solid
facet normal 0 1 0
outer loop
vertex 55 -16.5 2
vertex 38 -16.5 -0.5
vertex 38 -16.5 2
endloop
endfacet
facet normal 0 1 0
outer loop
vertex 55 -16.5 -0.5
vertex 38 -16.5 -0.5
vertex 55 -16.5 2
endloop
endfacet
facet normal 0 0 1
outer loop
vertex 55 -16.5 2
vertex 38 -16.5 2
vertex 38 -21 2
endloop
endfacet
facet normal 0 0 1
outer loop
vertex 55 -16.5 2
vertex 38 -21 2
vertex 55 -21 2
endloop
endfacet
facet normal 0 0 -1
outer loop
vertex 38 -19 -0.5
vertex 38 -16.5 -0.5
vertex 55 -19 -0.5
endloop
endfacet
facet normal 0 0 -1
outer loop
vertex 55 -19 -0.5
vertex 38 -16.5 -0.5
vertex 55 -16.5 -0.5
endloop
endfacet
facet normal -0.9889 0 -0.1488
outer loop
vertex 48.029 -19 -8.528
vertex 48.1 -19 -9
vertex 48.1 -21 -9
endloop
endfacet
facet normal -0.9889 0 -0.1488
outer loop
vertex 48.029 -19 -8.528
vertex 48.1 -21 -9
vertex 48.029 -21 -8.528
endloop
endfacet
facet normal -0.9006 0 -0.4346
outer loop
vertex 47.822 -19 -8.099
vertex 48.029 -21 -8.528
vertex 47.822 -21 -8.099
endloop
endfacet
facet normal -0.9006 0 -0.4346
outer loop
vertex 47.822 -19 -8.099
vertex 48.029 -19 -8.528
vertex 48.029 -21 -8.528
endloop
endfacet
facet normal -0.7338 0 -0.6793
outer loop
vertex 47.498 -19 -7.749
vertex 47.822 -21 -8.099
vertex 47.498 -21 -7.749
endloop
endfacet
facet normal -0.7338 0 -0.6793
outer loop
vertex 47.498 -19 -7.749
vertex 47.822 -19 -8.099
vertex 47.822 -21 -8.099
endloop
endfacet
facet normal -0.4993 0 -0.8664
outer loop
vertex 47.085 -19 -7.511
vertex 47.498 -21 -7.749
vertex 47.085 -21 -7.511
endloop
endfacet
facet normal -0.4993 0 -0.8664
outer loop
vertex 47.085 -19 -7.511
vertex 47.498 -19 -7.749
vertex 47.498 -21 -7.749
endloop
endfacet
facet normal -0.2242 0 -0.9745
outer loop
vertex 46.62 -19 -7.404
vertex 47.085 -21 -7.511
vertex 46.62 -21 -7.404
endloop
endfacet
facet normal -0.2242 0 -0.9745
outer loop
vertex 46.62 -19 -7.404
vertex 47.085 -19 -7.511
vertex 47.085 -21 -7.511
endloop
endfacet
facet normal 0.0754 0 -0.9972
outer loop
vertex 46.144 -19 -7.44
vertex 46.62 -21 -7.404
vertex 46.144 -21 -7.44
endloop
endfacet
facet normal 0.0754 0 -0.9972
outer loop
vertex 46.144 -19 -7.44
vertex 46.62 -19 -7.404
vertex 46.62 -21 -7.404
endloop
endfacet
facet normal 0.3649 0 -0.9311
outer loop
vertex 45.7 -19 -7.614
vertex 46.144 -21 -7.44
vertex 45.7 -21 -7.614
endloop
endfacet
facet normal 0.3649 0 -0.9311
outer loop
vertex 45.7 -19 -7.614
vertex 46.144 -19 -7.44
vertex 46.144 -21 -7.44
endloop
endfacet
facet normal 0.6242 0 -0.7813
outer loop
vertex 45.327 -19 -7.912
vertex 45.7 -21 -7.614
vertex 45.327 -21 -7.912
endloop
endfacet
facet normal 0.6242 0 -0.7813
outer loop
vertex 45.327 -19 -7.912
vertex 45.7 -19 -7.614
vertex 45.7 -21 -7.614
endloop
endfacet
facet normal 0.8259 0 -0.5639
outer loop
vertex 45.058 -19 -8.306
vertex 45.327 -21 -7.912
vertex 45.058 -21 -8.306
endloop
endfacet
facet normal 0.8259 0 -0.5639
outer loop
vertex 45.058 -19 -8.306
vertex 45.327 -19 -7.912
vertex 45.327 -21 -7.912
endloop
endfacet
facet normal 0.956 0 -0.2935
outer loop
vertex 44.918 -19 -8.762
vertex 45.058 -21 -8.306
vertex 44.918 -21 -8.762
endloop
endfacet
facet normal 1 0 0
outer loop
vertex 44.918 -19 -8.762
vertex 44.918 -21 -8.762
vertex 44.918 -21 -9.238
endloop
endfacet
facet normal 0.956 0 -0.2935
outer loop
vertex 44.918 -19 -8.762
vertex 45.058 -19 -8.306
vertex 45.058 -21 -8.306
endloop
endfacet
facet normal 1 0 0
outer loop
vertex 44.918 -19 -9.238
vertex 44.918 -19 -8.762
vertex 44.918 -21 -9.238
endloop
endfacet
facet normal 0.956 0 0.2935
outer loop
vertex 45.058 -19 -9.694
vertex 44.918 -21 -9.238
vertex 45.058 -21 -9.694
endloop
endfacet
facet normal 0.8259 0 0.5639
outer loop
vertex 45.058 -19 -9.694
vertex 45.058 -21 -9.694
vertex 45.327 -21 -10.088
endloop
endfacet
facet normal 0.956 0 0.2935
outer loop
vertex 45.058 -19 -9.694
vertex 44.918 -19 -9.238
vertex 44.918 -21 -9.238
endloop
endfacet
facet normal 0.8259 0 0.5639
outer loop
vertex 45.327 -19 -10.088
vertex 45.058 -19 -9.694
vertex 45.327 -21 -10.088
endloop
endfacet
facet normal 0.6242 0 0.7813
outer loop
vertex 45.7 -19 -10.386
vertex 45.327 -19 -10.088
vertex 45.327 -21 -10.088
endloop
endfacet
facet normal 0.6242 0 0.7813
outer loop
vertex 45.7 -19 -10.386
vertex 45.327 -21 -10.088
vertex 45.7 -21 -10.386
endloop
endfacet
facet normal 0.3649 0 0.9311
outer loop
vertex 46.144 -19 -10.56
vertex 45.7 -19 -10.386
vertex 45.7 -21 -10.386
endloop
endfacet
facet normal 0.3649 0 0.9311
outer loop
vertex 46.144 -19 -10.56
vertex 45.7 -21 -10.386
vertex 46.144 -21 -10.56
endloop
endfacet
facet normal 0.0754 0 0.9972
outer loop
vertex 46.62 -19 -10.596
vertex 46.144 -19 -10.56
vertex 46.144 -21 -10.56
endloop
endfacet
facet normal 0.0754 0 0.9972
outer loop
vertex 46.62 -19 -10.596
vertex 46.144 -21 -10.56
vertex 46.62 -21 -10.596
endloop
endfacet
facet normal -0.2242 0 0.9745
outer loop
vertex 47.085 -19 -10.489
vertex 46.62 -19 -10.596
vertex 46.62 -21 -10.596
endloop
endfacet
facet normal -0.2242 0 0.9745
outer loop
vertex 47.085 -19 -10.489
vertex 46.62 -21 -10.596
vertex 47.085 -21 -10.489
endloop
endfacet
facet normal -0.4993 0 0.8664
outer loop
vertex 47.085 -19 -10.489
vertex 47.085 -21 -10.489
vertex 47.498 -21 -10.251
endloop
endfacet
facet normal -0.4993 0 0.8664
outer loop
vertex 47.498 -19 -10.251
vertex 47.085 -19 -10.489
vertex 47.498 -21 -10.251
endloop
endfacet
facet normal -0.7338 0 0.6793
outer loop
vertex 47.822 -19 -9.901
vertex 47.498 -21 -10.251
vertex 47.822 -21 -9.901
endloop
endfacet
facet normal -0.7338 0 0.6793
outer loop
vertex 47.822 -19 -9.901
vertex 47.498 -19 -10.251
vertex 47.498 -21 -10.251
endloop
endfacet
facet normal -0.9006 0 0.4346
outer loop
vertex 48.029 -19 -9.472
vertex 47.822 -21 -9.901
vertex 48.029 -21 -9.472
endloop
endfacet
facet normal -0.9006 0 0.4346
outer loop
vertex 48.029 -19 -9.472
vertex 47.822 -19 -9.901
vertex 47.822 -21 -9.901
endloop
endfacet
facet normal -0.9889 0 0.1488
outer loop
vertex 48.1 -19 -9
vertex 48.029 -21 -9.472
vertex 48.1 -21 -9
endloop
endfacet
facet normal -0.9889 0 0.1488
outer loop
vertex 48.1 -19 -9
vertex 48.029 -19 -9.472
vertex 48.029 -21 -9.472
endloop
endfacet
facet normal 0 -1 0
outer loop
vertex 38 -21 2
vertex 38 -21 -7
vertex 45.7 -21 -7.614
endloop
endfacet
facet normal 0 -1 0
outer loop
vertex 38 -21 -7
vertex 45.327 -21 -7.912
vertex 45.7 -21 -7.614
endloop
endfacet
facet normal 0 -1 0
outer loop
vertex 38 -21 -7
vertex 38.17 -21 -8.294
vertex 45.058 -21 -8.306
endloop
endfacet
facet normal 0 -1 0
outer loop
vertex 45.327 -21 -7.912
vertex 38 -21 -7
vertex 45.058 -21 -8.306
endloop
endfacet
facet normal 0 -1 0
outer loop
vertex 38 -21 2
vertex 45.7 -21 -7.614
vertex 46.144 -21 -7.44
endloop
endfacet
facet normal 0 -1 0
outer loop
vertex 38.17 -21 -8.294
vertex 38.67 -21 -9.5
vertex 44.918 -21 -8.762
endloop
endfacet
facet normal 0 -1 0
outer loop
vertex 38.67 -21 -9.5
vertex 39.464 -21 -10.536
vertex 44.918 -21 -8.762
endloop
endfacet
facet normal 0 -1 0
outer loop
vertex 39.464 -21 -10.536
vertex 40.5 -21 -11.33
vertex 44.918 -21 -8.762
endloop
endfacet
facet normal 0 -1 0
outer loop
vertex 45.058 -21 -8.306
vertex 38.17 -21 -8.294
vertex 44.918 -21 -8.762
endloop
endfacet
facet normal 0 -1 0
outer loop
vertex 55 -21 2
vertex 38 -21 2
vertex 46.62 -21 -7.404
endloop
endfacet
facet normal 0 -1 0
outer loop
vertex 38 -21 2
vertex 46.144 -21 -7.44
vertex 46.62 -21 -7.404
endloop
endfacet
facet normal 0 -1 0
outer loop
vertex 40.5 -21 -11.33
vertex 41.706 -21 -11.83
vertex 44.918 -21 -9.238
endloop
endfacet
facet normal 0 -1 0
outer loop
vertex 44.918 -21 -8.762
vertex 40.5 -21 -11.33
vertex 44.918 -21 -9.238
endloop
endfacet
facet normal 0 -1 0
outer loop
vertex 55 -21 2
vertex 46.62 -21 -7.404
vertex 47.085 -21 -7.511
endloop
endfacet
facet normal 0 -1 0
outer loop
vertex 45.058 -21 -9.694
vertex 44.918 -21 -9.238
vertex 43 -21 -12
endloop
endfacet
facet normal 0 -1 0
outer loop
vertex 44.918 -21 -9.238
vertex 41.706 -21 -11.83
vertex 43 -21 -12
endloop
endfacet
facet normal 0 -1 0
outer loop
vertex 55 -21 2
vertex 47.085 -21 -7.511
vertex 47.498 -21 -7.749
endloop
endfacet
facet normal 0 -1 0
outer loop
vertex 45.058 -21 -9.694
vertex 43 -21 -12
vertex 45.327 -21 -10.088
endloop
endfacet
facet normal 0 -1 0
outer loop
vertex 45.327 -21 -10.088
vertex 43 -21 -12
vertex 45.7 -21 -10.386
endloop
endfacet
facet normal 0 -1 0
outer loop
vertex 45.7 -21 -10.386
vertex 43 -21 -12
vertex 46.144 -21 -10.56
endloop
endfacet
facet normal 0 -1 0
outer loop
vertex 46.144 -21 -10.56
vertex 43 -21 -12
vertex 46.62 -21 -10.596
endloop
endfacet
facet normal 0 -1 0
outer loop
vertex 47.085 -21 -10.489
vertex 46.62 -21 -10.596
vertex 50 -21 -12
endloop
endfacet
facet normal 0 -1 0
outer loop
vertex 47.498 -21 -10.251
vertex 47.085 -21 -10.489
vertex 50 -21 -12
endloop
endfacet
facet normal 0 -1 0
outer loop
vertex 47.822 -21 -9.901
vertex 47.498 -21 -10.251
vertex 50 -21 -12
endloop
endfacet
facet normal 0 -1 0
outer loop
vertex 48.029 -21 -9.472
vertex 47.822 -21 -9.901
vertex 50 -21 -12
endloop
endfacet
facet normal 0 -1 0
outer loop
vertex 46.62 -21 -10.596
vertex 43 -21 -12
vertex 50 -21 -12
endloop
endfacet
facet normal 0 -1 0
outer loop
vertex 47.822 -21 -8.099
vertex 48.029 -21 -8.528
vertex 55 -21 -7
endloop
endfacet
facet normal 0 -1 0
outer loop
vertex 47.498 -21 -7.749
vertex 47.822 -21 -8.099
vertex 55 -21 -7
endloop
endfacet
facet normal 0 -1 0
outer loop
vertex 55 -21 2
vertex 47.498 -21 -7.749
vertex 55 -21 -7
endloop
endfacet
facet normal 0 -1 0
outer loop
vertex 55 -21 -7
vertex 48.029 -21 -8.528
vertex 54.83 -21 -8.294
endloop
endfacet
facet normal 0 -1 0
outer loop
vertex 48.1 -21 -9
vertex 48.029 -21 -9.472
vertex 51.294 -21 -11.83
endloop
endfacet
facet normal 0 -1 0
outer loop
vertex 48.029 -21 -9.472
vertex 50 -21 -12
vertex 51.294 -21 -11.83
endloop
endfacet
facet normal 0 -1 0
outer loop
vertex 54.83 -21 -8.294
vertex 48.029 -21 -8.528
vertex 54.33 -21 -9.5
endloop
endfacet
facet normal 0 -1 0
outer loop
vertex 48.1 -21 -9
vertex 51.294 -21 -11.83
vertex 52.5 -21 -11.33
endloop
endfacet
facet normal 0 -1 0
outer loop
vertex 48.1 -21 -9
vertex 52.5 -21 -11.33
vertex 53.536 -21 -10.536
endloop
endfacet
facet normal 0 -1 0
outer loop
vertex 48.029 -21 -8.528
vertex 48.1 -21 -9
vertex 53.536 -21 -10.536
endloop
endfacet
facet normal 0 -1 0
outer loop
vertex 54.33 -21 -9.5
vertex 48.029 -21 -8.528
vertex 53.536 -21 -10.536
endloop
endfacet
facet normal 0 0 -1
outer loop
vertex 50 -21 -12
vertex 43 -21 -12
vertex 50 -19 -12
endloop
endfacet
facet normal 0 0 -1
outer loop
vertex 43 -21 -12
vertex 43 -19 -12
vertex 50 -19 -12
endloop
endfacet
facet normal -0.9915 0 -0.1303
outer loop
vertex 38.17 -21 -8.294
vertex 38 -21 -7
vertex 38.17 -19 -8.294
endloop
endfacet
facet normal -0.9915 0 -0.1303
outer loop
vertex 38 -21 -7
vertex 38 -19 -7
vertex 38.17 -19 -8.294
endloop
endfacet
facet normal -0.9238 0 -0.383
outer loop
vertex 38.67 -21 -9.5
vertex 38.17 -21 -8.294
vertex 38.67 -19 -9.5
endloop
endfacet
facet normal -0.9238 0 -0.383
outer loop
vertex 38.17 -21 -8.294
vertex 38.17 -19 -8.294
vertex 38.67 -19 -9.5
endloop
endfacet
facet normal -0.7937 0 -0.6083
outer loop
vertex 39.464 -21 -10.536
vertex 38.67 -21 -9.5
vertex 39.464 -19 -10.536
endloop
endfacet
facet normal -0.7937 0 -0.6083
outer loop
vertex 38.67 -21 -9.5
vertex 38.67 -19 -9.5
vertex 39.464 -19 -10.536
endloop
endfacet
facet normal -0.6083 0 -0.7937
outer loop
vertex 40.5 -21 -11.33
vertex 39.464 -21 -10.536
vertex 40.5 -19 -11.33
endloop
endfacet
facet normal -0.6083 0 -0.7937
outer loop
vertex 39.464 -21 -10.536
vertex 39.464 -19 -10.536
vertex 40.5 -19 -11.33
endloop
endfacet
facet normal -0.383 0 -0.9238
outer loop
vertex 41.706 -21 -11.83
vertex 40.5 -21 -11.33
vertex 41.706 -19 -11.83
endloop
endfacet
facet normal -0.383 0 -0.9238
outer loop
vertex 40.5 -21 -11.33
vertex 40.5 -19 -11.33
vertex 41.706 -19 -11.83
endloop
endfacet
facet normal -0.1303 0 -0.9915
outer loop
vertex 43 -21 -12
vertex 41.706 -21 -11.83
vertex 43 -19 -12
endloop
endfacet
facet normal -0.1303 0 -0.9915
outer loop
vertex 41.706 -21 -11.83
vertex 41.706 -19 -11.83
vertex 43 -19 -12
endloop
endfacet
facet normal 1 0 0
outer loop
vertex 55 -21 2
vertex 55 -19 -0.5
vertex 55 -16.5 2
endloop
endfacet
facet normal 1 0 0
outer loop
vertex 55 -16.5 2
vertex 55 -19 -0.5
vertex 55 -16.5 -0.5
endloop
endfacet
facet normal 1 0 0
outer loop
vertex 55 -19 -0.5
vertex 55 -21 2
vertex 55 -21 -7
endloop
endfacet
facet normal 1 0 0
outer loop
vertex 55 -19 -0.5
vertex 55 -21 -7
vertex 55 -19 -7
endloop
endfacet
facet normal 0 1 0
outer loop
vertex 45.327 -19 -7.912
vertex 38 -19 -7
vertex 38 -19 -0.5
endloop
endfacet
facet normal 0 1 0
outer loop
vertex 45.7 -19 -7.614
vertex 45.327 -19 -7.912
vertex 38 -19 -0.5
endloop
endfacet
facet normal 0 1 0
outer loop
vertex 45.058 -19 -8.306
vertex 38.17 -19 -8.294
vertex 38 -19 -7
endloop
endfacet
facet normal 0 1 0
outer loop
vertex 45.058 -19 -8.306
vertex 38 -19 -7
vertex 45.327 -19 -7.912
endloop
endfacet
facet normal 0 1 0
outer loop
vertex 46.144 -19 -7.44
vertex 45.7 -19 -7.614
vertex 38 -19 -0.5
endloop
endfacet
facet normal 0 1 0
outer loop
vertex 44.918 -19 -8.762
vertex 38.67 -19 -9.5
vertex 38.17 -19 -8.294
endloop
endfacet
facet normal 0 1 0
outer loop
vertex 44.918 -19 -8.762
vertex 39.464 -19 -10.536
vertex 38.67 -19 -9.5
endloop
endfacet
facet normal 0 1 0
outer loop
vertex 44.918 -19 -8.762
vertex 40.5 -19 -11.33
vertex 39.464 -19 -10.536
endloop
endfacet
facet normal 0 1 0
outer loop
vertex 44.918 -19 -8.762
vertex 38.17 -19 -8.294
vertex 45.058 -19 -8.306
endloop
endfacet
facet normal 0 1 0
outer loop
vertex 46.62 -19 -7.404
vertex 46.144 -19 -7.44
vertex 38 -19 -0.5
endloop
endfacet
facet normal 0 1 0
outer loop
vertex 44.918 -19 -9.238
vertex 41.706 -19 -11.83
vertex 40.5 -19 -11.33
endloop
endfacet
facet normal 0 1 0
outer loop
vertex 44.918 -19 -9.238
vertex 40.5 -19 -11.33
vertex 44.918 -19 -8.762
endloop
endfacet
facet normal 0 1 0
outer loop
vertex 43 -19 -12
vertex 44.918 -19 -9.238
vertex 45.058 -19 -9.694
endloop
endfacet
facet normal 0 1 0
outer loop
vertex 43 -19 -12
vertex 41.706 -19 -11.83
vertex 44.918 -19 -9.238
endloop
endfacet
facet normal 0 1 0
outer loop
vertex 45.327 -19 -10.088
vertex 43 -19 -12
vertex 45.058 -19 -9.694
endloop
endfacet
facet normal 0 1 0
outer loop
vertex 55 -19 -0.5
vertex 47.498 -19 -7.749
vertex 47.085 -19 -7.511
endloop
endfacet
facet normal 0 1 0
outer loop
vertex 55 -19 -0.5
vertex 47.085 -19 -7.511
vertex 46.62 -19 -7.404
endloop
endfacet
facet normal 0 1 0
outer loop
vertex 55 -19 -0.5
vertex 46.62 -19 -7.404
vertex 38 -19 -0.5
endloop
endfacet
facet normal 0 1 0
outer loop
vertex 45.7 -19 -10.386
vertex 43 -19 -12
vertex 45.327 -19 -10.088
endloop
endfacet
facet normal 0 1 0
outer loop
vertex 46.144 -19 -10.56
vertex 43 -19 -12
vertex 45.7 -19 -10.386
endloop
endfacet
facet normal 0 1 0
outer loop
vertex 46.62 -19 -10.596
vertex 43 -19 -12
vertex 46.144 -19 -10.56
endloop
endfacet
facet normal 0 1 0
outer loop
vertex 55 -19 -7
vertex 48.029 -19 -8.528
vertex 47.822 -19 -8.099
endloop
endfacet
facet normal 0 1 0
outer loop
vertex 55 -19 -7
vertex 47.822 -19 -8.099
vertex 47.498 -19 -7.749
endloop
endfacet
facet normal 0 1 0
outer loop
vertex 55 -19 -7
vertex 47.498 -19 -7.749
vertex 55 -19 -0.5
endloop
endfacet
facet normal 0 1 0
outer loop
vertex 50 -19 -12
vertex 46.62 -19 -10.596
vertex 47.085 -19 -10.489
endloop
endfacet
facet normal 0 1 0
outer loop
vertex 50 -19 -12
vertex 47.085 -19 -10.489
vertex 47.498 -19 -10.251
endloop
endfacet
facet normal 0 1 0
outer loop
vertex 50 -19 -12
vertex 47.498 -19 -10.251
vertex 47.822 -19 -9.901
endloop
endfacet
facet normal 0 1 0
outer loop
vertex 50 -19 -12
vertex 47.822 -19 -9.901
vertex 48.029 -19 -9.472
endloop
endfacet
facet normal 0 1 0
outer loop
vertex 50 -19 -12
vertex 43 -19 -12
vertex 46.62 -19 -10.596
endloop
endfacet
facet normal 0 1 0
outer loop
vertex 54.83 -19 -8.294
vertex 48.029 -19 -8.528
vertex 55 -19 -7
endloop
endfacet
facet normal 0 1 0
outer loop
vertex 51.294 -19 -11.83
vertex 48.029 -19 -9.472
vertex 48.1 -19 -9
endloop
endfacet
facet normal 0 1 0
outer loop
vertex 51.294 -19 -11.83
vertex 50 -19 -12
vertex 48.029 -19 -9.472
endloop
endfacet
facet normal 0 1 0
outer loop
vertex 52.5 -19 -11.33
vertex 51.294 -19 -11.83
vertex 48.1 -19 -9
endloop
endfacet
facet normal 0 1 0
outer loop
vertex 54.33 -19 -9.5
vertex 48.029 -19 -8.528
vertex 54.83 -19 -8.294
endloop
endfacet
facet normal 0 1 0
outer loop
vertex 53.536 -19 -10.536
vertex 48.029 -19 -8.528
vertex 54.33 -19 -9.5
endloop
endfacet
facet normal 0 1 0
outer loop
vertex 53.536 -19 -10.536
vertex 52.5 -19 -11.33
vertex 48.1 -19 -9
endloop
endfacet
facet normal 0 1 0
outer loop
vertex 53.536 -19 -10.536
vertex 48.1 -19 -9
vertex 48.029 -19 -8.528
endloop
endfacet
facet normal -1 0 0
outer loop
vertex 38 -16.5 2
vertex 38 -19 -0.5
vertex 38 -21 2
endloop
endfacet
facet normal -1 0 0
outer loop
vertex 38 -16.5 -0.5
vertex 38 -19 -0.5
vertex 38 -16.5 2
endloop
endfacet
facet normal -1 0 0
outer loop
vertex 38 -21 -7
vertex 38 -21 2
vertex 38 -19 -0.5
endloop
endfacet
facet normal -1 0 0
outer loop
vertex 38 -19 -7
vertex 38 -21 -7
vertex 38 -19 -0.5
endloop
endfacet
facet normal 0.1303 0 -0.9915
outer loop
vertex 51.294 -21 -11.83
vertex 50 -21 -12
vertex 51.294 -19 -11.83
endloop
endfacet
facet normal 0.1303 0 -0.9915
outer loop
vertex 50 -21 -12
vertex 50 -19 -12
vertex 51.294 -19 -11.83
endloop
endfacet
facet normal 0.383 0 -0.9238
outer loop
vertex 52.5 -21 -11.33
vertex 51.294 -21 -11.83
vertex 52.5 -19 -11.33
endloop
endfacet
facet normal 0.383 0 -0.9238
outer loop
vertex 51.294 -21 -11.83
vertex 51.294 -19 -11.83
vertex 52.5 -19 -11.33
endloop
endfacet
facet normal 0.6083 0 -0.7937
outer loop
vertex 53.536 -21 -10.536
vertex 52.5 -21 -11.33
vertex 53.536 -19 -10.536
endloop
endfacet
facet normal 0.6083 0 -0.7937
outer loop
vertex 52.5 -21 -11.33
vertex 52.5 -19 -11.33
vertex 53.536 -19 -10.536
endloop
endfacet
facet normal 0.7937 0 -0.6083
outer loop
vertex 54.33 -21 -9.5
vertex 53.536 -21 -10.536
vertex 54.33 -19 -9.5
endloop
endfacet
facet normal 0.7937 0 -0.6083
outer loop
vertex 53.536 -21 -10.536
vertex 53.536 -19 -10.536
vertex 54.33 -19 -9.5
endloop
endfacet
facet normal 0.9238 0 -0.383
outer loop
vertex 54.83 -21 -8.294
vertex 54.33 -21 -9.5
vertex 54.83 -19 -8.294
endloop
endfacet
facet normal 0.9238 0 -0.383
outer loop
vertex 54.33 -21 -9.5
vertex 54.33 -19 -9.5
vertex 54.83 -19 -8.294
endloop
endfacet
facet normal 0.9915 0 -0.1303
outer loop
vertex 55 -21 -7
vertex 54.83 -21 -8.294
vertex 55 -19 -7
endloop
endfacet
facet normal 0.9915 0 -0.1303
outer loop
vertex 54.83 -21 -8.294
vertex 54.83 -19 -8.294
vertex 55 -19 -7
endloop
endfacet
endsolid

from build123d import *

# Parameters (mm, degrees)
CYLINDER074_R     = 1.6
CYLINDER074_DEPTH = 2
BOX188_W          = 17
BOX188_H          = 2
BOX188_DEPTH      = 14
FILLET042_R       = 5
BOX187_W          = 17
BOX187_H          = 2.5
BOX187_DEPTH      = 2.5


with BuildPart() as cylinder155:
    # Cylinder074 → Cylinder074 (new body)
    with BuildSketch(Plane(origin=(46.5, -19, -9), x_dir=(1, 0, 0), z_dir=(0, -1, 0))):
        Circle(CYLINDER074_R)
    extrude(amount=CYLINDER074_DEPTH)


with BuildPart() as fillet042:
    # Box188 → Box188 (new body)
    with BuildSketch(Plane(origin=(38, -21, -12), x_dir=(1, 0, 0), z_dir=(0, 0, 1))):
        with Locations((8.5, 1)):
            Rectangle(BOX188_W, BOX188_H)
    extrude(amount=BOX188_DEPTH)

    # Cut097: cut Cylinder155
    add(cylinder155.part, mode=Mode.SUBTRACT)

    # Fillet042
    fillet042_edges = [fillet042.edges().sort_by_distance(p)[0] for p in [
        (38, -20, -12),
        (55, -20, -12),
    ]]
    fillet(fillet042_edges, radius=FILLET042_R)


with BuildPart() as fusion059:
    # Box187 → Box187 (new body)
    with BuildSketch(Plane(origin=(38, -19, -0.5), x_dir=(1, 0, 0), z_dir=(0, 0, 1))):
        with Locations((8.5, 1.25)):
            Rectangle(BOX187_W, BOX187_H)
    extrude(amount=BOX187_DEPTH)

    # Fusion059: union Fillet042
    add(fillet042.part)


solid = fusion059.part
